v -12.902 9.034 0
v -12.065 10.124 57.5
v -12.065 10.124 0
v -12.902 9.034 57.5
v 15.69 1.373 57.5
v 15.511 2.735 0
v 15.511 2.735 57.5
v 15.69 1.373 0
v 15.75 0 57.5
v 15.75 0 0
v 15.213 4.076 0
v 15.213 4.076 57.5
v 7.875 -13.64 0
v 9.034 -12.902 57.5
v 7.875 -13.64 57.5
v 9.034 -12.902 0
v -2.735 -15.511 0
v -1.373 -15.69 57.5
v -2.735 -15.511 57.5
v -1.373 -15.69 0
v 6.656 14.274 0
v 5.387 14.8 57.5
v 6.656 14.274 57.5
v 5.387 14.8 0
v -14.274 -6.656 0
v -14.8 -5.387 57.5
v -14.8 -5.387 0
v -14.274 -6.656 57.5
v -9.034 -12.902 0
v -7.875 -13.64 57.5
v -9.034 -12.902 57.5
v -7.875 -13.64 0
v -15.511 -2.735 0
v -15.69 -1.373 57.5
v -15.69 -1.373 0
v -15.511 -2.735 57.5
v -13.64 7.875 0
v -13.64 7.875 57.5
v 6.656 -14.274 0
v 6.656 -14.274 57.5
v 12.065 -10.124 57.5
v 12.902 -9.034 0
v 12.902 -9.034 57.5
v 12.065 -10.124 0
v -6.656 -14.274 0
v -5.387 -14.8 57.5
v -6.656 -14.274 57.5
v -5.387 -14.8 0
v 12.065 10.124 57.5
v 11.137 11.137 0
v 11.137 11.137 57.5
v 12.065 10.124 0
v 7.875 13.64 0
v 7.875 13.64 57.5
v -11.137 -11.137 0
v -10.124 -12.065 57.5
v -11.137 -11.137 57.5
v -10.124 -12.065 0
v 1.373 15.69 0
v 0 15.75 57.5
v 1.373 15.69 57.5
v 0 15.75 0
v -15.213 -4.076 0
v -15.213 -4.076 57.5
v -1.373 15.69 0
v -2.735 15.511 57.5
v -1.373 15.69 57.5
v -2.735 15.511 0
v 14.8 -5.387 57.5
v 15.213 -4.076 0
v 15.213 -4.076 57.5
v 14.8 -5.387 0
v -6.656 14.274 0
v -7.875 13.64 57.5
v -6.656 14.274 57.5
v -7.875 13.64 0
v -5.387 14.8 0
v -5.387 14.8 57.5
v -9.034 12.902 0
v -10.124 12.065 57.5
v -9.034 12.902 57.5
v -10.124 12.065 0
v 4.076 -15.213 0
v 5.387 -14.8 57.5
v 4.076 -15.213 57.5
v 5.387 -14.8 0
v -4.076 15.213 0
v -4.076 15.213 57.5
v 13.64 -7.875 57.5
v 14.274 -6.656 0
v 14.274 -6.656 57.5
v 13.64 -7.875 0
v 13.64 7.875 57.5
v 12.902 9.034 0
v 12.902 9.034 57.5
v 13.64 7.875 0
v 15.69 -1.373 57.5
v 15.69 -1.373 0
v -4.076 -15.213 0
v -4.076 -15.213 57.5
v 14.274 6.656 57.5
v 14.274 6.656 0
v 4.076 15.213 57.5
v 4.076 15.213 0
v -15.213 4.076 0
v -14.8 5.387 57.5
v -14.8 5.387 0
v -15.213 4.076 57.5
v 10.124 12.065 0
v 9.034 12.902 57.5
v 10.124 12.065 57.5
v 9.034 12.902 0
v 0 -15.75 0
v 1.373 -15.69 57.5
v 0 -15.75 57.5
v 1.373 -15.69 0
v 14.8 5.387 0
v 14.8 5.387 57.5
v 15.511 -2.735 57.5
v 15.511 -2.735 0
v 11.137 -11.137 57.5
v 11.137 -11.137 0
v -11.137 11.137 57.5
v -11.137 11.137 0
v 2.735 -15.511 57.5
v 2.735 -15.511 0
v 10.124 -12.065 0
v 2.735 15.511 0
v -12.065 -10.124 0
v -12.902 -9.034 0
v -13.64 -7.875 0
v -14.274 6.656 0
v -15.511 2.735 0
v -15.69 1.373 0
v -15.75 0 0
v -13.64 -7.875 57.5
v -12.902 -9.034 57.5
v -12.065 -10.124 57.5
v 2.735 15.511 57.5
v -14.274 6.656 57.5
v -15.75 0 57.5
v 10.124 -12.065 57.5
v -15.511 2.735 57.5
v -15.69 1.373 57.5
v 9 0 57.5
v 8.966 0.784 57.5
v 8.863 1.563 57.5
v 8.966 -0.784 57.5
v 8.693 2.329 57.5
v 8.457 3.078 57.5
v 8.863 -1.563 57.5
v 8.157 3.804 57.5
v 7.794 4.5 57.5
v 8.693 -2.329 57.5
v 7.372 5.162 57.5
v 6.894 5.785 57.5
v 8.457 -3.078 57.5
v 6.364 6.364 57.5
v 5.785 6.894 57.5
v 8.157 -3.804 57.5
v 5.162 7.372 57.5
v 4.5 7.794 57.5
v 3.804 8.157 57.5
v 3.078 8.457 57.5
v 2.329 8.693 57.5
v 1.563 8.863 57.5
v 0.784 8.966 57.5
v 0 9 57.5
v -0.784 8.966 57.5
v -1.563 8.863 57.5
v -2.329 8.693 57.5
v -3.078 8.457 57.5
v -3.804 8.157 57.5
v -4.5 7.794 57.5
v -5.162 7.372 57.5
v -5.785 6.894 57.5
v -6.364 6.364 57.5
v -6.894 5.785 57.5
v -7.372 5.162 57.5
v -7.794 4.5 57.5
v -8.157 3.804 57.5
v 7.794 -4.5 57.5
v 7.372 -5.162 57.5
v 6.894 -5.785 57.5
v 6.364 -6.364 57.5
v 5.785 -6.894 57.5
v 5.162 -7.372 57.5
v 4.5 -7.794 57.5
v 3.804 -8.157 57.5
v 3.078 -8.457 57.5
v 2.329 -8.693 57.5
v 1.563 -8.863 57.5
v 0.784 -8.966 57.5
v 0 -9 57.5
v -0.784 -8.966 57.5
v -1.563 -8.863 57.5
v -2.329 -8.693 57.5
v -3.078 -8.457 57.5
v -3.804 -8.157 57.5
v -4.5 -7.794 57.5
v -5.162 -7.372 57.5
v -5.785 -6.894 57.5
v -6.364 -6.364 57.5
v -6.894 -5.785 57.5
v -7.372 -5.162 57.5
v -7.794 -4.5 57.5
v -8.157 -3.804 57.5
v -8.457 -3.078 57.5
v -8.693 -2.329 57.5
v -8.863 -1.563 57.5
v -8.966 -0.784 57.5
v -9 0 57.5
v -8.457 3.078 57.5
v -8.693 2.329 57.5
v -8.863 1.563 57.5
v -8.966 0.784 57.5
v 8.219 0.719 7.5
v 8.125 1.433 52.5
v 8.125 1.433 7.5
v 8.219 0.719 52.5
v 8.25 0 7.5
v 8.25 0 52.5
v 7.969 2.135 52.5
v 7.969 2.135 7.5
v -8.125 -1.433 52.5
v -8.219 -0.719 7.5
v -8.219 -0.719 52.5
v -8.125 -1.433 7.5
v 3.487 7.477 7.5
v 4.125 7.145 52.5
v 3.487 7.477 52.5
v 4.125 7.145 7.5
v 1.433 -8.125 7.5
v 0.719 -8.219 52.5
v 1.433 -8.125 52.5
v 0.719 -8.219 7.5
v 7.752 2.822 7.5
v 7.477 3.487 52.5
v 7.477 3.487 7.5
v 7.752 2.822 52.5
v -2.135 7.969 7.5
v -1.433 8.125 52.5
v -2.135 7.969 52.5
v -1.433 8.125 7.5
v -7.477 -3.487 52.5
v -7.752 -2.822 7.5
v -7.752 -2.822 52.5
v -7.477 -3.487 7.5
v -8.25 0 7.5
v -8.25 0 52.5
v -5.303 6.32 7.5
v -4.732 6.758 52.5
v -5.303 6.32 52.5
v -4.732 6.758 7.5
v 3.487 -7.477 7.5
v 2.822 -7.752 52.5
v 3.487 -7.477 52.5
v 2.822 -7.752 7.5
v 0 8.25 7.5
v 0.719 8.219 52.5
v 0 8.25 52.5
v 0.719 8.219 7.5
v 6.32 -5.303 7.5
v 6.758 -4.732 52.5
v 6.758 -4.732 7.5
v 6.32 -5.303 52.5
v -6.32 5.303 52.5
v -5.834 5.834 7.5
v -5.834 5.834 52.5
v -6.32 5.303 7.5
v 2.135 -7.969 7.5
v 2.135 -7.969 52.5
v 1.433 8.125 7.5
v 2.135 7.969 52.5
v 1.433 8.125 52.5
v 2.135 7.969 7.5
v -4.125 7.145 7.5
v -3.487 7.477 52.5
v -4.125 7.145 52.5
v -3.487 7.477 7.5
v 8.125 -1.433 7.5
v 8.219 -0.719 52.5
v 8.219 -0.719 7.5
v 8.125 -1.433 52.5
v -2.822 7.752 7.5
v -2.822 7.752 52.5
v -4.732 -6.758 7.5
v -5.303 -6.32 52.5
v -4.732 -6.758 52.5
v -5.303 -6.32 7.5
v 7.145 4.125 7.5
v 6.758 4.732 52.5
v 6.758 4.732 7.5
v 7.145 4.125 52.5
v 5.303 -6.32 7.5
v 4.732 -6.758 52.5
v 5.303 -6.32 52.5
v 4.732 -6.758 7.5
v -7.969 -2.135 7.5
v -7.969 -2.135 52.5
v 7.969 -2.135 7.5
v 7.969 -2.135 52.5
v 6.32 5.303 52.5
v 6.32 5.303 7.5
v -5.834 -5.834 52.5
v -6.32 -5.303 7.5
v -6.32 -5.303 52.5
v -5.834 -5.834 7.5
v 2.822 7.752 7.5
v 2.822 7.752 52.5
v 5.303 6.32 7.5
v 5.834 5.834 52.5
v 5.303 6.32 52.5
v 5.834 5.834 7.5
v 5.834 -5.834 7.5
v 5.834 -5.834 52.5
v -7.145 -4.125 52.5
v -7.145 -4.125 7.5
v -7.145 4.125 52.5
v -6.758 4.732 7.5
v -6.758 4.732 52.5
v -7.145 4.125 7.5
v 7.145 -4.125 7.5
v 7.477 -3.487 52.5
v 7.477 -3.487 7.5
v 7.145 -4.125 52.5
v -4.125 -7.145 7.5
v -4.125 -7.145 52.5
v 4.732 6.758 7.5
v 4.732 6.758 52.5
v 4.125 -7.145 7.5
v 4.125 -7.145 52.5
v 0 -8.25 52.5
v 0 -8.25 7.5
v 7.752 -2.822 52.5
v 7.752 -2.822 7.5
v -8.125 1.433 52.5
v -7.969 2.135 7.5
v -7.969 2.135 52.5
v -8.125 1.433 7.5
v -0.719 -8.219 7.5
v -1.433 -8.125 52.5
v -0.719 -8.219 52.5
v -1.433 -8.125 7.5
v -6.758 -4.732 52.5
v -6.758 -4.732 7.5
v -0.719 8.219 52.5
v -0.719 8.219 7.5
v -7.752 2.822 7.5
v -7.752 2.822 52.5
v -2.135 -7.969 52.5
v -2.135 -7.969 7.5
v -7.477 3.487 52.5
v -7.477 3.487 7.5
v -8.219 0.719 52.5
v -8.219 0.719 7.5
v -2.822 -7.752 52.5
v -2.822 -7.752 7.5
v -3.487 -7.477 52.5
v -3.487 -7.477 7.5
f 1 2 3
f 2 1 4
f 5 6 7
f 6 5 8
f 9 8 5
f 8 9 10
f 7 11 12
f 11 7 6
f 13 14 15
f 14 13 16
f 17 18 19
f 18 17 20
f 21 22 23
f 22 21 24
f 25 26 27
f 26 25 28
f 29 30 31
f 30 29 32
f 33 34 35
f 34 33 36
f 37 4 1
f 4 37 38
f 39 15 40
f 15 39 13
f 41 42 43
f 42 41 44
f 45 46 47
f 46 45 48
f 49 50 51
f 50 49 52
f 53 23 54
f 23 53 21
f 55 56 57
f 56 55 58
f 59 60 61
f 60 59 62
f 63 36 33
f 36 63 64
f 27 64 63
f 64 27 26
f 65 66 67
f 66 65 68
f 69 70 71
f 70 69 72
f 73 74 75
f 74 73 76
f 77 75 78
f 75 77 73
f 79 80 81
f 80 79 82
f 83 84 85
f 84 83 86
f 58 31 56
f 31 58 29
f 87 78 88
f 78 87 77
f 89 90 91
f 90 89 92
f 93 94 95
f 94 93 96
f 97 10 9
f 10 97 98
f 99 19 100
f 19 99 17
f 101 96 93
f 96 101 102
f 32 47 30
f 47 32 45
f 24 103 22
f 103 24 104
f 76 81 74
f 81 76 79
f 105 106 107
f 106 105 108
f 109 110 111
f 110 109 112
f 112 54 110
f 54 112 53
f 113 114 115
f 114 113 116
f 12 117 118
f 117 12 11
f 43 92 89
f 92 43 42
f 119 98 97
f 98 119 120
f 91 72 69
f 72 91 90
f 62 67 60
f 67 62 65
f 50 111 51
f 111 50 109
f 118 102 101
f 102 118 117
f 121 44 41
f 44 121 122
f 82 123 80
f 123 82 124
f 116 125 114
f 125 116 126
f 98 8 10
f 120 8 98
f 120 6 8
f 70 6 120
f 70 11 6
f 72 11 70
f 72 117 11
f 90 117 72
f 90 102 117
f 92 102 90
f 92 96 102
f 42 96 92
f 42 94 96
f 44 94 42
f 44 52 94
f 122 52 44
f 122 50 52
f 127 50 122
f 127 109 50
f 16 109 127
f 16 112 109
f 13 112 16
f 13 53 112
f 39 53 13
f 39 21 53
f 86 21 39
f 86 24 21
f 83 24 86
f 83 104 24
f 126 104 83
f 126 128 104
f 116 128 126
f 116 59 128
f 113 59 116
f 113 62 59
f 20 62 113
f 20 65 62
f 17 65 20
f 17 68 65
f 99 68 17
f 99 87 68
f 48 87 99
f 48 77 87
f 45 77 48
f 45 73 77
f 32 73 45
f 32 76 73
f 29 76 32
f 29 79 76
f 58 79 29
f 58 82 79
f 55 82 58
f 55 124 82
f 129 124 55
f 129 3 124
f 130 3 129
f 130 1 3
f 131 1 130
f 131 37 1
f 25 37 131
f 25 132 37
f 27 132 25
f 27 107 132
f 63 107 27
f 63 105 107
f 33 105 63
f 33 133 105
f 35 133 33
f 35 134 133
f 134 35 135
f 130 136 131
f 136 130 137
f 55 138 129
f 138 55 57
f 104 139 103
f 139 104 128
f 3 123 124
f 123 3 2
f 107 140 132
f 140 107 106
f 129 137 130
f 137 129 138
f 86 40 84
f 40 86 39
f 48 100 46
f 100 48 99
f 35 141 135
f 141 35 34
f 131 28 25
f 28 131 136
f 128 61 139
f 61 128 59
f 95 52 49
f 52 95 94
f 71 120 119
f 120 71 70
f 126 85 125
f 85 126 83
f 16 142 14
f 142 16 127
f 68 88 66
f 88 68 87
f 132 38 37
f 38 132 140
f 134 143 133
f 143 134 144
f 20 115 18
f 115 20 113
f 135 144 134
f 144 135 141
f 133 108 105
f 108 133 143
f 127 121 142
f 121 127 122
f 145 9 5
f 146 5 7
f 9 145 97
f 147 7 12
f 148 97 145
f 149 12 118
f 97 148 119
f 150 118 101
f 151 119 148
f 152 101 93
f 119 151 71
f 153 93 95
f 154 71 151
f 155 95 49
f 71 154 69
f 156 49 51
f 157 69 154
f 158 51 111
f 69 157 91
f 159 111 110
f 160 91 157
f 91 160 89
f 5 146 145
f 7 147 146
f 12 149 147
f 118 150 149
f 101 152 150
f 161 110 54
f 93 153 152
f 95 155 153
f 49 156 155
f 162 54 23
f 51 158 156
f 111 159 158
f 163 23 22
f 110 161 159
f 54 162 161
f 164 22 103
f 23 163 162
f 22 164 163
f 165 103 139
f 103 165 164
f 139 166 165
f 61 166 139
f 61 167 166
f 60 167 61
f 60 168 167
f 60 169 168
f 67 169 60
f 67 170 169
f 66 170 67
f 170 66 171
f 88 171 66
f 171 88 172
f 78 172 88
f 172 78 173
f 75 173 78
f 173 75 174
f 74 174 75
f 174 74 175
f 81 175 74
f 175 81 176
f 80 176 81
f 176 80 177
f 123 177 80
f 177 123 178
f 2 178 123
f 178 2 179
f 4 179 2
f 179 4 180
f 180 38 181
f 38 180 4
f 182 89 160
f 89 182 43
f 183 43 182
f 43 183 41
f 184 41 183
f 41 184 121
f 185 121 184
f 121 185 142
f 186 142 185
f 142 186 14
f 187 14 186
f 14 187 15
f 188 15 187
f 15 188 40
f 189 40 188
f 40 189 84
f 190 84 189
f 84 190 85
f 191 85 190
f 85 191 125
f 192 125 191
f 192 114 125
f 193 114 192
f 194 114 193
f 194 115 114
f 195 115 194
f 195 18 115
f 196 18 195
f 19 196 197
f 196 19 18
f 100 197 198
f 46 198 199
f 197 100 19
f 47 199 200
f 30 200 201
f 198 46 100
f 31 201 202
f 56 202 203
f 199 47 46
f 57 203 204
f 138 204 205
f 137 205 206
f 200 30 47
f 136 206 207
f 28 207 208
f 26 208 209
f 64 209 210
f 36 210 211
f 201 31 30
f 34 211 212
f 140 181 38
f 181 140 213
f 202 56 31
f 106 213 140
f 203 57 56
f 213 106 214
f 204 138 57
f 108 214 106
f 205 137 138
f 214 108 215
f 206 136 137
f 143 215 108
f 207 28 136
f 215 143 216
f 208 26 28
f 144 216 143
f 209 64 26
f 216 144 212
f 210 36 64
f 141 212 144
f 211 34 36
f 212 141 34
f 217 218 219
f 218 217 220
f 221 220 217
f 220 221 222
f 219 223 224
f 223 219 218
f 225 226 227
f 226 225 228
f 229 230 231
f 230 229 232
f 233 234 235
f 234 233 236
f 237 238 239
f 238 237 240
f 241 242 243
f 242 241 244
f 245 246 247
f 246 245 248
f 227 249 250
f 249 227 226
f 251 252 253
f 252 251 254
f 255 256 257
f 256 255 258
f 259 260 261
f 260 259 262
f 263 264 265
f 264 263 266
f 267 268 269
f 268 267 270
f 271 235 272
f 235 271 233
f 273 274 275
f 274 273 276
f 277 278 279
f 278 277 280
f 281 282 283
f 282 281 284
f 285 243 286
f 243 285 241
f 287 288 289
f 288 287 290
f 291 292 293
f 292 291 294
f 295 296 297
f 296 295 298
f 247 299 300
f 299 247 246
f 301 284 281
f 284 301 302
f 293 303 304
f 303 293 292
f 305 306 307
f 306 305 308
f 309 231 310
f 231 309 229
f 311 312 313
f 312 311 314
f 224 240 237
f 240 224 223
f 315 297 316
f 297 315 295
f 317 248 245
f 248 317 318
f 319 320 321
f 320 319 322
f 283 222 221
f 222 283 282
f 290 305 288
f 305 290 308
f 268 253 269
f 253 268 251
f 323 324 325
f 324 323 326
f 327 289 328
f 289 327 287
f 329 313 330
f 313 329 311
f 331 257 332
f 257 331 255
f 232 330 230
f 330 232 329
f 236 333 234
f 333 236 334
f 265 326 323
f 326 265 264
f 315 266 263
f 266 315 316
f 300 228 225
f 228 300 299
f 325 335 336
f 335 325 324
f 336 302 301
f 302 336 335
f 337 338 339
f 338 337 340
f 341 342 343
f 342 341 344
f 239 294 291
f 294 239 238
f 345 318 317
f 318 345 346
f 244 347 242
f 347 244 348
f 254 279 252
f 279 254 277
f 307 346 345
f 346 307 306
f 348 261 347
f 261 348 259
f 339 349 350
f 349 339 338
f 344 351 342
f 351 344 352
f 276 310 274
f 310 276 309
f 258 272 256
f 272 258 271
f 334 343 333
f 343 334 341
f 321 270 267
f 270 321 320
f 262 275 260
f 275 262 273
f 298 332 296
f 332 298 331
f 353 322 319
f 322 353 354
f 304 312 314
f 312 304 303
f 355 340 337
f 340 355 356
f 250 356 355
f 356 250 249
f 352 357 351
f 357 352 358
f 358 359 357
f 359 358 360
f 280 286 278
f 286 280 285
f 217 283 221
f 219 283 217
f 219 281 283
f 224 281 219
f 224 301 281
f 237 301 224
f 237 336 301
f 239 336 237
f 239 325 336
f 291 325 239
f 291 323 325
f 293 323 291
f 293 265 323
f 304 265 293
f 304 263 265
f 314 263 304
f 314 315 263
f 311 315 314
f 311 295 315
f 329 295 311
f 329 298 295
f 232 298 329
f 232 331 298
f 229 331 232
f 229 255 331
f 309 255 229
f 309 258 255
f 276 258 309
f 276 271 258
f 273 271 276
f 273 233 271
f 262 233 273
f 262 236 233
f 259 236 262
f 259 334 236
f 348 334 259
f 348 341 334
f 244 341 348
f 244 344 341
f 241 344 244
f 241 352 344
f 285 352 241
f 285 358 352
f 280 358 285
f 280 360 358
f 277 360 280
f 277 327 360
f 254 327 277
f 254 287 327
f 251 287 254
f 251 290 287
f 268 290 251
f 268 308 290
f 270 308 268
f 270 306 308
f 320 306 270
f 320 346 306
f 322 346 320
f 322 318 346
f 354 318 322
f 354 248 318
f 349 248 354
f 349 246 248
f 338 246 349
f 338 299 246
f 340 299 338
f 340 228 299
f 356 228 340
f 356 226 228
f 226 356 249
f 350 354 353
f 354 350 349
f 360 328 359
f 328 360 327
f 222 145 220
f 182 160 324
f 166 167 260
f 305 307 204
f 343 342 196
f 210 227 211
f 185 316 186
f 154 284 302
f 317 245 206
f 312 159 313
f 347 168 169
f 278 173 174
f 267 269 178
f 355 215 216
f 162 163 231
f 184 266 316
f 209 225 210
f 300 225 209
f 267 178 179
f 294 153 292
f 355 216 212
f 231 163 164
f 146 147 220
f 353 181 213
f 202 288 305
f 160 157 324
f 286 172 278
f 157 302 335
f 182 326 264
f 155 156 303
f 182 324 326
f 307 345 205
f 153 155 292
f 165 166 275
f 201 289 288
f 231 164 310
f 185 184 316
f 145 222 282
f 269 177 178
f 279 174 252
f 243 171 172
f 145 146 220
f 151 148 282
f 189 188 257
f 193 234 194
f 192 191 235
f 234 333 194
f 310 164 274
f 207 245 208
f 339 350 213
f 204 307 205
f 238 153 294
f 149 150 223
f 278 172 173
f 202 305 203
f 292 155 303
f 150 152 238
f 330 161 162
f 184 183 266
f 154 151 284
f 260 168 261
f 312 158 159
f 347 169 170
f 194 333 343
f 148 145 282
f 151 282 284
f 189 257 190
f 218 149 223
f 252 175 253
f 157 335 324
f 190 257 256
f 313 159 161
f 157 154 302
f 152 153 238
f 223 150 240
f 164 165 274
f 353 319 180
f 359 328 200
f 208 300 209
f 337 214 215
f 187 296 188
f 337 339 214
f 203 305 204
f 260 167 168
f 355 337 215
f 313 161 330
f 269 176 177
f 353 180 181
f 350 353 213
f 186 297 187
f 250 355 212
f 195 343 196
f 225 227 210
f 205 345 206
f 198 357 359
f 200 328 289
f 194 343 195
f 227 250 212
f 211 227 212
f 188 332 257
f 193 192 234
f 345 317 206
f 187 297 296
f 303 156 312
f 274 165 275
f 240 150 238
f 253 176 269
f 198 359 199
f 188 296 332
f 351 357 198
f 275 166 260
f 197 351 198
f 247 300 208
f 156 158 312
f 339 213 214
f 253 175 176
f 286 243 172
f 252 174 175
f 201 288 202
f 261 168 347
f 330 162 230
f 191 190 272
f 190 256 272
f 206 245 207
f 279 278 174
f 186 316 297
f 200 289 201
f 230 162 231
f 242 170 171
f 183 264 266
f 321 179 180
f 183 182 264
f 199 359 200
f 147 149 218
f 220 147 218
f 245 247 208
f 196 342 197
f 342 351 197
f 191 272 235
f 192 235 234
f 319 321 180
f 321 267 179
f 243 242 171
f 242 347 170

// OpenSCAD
// file: measurements.scad
// The thickness of any walls (e.g. the difference between the inner and outer radiuses of a tube retainer).
thickness_mm = 7.5;

// The tube which spaces apart the VESA mount and the Kinect mount.
////////////////////////////////////////////////////////////////////////////////

// The diameter of the narrowest part of the tube's retainer.
tube_retainer_diameter_mm = 16.5;

// The total length of the tube's retainer.
tube_retainer_length_mm = 50;

// The diameter of the widest part of the tube's retainer.
tube_feed_diameter_mm = 18;

// The length of the transition between the widest and narrowest parts of the
// tube's retainer.
tube_feed_length_mm = 5;

// The number of sides on the tube's retainer.
tube_sides = 72;

// Additional radius added where a tube mounting meets a surface.
tube_widening_mm = 10;

// Kinect for Xbox 360.
////////////////////////////////////////////////////////////////////////////////

// The length of the Kinect's base.
kinect_length_mm = 75;

// The width of the bottom of the Kinect's base.
kinect_lower_width_mm = 81;

// The thickness of the base below the Kinect.
kinect_base_height_mm = 2;

// The width of the middle of the Kinect's base (its widest point).
kinect_middle_width_mm = 88.5;

// The distance between the bottom of the Kinect's base and its widest point.
kinect_lower_height_mm = 13;

// The width of the top of the Kinect's base.
kinect_top_width_mm = 80;

// The distance between the widest point of the Kinect's base and the top of the
// retainer.
kinect_upper_height_mm = 5;

// The thickness of the Kinect's retainer.
kinect_clip_thickness_mm = 2;

// The diameter of the head of the M3 screw used to secure the Kinect.
kinect_screw_head_diameter_mm = 7;

// The diameter of the hole required by the M3 screw used to secure the Kinect.
kinect_screw_hole_diameter_mm = 2.95;

// The number of sides of the head of or the hole required by the M3 screw used
// to secure the Kinect.
kinect_screw_sides = 24;

// The height of the internal bridges used to support screw holes.
kinect_screw_hole_bridge_height_mm = 0.75;

// The distance between the Kinect's front and back screw holes.
kinect_screw_y_spacing_mm = 19.25;

// The distance between the Kinect's left and right screw holes.
kinect_screw_x_spacing_mm = 68.5;

// The space which must be clear behind a Kinect for cable routing.
kinect_cable_spacing_mm = 15;

// The VESA mounting.
////////////////////////////////////////////////////////////////////////////////

// The diameter of the VESA mounting M6 screw's head.
vesa_screw_head_diameter_mm = 14;

// The diameter of the VESA mounting M6 screw's hole.
vesa_screw_hole_diameter_mm = 6.5;

// The number of sides of the VESA mounting M6 screw.
vesa_screw_sides = 72;

// The height of the VESA mounting M6 screw's head.
vesa_screw_height_height_mm = 4;

// The MALM push-fit bracket.
////////////////////////////////////////////////////////////////////////////////

// The thickness of the desk.
malm_height_mm = 50.5;

// The length of the fingers which push onto the desk.  Increase to improve
// pitch stability.
malm_length_mm = 70;

// The width of the fingers which push onto the desk.  Increase to improve roll
// stability.
malm_width_mm = 60;
// main file
include <measurements.scad>

difference() {
    cylinder(
        d = tube_retainer_diameter_mm + thickness_mm * 2,
        h = thickness_mm + tube_retainer_length_mm,
        $fn = tube_sides
    );

    translate([0, 0, thickness_mm]) {
        cylinder(
            d = tube_retainer_diameter_mm,
            h = tube_retainer_length_mm,
            $fn = tube_sides
        );
    };

    translate([0, 0, thickness_mm + tube_retainer_length_mm - tube_feed_length_mm]) {
        cylinder(
            d1 = tube_retainer_diameter_mm,
            d2 = tube_feed_diameter_mm,
            h = tube_feed_length_mm,
            $fn = tube_sides
        );
    };
};
